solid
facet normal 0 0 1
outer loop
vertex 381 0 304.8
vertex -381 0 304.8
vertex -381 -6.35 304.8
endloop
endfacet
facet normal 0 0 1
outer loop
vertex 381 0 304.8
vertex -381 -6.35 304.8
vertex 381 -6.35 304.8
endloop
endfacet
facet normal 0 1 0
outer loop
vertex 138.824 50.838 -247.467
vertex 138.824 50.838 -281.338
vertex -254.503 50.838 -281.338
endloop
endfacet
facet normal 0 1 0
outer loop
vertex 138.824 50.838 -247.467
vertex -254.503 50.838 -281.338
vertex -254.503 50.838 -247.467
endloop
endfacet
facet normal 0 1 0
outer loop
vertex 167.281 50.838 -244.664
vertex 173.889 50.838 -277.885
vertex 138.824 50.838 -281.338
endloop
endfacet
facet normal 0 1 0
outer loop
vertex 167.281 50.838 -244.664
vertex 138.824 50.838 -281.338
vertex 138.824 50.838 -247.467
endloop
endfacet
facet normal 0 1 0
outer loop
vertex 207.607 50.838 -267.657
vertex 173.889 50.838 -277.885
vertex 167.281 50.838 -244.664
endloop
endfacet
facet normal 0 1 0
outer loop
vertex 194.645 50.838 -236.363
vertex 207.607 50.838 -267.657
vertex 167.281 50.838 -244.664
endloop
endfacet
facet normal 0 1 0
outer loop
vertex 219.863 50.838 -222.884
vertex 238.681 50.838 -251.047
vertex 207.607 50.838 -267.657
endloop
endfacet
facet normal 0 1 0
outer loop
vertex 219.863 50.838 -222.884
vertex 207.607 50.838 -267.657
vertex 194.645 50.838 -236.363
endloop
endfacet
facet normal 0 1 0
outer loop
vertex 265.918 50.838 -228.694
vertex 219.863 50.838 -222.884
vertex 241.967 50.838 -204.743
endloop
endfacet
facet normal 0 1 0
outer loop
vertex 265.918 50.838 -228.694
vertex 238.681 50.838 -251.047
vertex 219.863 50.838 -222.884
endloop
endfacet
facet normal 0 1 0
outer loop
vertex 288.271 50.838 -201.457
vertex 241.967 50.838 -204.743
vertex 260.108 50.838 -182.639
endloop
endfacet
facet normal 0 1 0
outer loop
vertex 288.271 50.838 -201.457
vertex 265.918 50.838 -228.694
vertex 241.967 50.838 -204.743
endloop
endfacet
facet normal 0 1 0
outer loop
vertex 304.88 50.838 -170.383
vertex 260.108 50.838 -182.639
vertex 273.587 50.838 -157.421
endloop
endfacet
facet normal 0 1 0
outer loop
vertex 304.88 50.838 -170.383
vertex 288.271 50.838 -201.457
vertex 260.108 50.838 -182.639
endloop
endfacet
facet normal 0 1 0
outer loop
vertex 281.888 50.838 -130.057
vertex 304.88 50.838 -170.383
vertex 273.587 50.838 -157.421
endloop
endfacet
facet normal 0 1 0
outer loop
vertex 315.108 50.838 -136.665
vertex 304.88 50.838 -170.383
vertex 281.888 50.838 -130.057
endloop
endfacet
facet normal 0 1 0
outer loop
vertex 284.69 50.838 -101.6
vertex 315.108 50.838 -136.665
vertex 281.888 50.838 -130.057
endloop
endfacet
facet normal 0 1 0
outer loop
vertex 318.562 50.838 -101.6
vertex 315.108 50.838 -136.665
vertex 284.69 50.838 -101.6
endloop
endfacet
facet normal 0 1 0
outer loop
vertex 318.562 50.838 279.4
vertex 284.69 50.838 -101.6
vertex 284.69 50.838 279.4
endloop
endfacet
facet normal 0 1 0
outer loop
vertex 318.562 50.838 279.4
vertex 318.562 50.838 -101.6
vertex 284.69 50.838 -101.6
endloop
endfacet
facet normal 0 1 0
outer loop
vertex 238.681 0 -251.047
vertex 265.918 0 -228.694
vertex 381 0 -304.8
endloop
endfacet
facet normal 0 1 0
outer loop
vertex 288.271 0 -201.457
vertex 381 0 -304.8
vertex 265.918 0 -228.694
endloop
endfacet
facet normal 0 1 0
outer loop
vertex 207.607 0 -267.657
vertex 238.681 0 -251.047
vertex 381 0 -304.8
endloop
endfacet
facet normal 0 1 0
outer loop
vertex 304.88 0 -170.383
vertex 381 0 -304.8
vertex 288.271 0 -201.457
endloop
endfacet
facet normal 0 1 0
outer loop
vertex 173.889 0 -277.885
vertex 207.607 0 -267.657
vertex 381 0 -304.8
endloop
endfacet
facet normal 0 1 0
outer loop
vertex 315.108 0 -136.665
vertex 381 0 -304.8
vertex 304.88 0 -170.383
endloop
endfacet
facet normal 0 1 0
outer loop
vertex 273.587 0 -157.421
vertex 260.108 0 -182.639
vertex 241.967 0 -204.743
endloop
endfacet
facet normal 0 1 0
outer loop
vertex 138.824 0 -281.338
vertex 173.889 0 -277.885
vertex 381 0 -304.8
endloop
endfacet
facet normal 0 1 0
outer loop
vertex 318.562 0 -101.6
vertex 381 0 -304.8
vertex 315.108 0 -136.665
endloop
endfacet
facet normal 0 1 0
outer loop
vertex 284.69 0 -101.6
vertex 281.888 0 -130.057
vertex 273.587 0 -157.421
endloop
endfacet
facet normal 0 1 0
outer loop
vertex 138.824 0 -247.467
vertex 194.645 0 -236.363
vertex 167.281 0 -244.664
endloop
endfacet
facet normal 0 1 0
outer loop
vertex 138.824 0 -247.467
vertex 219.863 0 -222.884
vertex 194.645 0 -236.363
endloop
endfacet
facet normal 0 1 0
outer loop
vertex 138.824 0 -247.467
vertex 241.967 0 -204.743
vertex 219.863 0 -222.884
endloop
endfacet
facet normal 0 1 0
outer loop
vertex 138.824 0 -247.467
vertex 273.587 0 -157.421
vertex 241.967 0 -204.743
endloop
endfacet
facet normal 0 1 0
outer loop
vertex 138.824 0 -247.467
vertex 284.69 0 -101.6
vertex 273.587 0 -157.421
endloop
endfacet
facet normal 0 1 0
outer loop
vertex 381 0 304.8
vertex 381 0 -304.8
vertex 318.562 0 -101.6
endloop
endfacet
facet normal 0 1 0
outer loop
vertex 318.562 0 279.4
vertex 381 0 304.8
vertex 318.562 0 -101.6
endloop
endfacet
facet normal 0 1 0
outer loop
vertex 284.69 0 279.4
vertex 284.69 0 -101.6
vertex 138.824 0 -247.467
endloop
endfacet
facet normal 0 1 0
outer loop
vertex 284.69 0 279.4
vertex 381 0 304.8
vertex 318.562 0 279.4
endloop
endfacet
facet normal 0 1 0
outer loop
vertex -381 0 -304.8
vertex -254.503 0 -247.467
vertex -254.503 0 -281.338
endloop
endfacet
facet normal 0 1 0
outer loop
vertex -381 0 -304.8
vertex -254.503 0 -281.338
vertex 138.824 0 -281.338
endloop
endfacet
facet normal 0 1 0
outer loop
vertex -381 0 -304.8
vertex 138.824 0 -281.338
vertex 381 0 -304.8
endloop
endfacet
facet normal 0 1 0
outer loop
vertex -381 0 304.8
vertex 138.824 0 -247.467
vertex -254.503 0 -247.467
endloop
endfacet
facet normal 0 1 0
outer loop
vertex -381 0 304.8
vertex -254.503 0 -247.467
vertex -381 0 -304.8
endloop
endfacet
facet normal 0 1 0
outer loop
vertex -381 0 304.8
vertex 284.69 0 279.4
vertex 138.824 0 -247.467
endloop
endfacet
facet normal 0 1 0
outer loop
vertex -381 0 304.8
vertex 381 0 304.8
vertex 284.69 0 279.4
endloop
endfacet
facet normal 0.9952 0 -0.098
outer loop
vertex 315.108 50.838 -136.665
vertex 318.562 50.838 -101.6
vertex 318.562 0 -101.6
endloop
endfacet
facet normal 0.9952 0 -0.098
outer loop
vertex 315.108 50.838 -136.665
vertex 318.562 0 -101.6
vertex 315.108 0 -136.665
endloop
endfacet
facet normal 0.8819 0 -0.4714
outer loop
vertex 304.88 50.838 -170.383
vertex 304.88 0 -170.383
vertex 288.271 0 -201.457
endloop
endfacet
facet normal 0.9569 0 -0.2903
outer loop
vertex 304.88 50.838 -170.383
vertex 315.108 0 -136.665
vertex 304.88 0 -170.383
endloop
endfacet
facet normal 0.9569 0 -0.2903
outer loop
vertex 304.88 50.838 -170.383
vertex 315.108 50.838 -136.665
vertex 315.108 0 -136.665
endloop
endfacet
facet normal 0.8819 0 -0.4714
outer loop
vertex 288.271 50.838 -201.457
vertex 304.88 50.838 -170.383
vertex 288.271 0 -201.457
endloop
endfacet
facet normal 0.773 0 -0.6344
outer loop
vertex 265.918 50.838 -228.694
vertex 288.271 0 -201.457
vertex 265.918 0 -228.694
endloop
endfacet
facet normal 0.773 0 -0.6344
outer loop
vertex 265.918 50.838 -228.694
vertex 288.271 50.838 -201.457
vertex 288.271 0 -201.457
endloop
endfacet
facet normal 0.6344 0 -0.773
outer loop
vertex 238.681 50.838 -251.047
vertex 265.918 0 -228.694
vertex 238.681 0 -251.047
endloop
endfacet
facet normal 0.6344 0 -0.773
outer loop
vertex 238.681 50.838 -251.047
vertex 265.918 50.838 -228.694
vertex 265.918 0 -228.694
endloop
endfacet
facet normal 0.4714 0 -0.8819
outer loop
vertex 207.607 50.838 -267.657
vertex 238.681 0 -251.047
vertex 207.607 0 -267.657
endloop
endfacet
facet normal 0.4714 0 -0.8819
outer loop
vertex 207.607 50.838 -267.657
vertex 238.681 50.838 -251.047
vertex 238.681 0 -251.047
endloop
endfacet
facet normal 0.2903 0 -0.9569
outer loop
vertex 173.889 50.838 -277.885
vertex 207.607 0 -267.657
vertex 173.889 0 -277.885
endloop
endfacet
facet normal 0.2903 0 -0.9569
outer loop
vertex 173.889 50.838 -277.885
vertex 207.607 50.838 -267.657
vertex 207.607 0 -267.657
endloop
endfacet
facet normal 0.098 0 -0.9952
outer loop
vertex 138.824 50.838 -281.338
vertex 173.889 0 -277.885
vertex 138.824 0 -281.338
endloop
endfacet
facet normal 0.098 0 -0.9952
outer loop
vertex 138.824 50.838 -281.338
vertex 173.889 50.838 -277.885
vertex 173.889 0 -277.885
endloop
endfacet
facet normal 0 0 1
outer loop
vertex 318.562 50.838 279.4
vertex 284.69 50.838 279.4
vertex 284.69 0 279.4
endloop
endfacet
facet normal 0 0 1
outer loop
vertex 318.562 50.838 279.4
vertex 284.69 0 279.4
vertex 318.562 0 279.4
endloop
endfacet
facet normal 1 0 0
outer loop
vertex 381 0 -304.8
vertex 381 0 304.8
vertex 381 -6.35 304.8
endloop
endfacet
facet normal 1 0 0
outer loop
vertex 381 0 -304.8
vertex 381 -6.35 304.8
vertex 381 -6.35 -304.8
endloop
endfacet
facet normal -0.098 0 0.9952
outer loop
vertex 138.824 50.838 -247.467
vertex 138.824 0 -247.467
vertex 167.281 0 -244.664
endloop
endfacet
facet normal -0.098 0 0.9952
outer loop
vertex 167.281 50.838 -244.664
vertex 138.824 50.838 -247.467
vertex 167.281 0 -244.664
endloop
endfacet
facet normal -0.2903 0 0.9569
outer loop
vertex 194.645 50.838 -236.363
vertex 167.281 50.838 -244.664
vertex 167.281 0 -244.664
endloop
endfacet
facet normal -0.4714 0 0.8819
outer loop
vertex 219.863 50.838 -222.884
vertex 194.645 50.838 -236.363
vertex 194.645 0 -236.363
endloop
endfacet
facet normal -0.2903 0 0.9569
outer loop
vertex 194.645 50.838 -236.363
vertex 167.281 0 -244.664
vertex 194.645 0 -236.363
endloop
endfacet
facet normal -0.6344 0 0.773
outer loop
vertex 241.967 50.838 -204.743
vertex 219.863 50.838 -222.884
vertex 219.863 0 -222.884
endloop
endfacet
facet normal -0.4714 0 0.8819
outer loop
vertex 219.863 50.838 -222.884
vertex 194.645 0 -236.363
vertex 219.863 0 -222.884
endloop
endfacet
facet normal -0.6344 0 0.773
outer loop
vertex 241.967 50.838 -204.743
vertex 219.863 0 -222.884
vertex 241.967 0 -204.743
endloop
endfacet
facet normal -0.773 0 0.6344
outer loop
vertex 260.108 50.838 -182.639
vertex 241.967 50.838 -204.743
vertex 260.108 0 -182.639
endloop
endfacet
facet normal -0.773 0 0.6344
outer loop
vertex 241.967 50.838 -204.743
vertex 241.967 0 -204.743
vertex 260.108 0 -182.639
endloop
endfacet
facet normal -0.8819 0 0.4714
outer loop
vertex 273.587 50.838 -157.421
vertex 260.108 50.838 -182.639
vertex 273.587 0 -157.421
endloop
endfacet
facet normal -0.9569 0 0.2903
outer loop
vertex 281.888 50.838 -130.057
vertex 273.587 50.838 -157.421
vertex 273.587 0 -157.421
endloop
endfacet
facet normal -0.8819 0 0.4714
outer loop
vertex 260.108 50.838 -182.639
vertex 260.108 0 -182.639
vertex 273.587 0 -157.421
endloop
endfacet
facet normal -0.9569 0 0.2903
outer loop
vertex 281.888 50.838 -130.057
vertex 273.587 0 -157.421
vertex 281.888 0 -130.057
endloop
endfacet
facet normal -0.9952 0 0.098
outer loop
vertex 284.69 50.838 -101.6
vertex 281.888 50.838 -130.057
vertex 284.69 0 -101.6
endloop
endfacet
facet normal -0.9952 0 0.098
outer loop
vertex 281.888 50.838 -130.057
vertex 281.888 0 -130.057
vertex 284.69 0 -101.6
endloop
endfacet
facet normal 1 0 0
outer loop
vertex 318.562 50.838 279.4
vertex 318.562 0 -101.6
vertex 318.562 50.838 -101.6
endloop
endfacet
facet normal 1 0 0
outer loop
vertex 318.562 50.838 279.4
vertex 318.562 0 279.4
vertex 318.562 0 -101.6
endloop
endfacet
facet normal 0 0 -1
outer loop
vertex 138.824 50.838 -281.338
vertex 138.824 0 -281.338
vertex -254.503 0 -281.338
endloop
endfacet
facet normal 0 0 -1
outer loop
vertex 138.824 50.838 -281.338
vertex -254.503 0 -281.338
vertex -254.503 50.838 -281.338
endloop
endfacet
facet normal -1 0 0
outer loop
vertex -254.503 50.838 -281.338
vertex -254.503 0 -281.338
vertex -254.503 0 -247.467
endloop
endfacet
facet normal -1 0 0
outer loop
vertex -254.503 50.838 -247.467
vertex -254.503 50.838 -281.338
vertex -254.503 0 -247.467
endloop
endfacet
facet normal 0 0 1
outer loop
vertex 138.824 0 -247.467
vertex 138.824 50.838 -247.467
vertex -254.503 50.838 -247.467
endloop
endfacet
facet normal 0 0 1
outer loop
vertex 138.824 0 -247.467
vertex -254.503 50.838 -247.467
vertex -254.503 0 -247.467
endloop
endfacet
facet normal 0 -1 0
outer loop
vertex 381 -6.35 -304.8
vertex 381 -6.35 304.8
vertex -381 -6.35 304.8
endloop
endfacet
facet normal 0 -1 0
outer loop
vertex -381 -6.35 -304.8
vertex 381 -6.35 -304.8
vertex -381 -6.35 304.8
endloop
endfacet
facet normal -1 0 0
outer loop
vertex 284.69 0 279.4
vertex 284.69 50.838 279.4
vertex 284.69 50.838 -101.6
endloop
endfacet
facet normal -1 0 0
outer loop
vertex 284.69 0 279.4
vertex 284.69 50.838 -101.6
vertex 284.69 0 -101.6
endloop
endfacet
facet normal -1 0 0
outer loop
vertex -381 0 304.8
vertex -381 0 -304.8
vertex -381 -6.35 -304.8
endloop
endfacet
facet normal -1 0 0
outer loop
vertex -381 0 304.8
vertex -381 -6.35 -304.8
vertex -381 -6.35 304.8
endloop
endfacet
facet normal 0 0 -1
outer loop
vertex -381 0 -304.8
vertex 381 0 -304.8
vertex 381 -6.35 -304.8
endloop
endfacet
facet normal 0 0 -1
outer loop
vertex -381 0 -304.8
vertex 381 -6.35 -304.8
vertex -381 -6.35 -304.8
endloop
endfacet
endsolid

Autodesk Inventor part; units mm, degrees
ref_plane "YZ Plane" through (0, 0, 0) normal (1, 0, 0) x (0, 1, 0)
ref_plane "XZ Plane" through (0, 0, 0) normal (0, 1, 0) x (-1, 0, 0)
sketch "Sketch1" plane through (0, 0, 0) normal (0, 1, 0) x (-1, 0, 0)
  line L0 (-381, 304.8) -> (-381, -304.8)
  line L1 (-381, -304.8) -> (381, -304.8)
  line L2 (381, -304.8) -> (381, 304.8)
  line L3 (381, 304.8) -> (-381, 304.8)
  line L4 (-381, 304.8) -> (381, -304.8) construction
  line L5 (-381, -304.8) -> (381, 304.8) construction
  point P0 (0, 0)
  dimension "width" = 609.6
  dimension "length" = 762
extrude "Extrusion1" add sketch "Sketch1" against normal blind 6.35
ref_plane "Work Plane1" through (-381, 0, 274.6375) normal (0, 0, 1) x (1, 0, 0)
sketch "Sketch2" plane through (0, 0, 0) normal (0, 1, 0) x (1, 0, 0)
  line L0 (-254.5026, 247.65) -> (138.8237, 247.65)
  line L1 (284.8737, 101.6) -> (284.8737, -279.4)
  arc A0 (284.8737, 101.6) -> (138.8237, 247.65) centre (138.8237, 101.6) ccw
  line L2 (-381, -304.8) -> (381, -304.8) projected
  point P0 (0, 0)
  dimension "d4" = 292.1
  dimension "d5" = 381
  dimension "d6" = 558.8
  dimension "d10" = 25.4
sketch "Sketch3" plane through (-381, 0, 274.6375) normal (0, 0, 1) x (1, 0, 0)
  line L0 (665.6905, 0) -> (699.5621, 0)
  line L1 (699.5621, 0) -> (699.5621, 50.8385)
  line L2 (699.5621, 50.8385) -> (665.6905, 50.8385)
  line L3 (665.6905, 50.8385) -> (665.6905, 0)
  point P0 (381, 0)
sweep "Sweep1" add profiles "Sketch3" path "Sketch2" path curves L1 A0 L0
properties part number "ShooterBase" material "Wood (Birch)"
